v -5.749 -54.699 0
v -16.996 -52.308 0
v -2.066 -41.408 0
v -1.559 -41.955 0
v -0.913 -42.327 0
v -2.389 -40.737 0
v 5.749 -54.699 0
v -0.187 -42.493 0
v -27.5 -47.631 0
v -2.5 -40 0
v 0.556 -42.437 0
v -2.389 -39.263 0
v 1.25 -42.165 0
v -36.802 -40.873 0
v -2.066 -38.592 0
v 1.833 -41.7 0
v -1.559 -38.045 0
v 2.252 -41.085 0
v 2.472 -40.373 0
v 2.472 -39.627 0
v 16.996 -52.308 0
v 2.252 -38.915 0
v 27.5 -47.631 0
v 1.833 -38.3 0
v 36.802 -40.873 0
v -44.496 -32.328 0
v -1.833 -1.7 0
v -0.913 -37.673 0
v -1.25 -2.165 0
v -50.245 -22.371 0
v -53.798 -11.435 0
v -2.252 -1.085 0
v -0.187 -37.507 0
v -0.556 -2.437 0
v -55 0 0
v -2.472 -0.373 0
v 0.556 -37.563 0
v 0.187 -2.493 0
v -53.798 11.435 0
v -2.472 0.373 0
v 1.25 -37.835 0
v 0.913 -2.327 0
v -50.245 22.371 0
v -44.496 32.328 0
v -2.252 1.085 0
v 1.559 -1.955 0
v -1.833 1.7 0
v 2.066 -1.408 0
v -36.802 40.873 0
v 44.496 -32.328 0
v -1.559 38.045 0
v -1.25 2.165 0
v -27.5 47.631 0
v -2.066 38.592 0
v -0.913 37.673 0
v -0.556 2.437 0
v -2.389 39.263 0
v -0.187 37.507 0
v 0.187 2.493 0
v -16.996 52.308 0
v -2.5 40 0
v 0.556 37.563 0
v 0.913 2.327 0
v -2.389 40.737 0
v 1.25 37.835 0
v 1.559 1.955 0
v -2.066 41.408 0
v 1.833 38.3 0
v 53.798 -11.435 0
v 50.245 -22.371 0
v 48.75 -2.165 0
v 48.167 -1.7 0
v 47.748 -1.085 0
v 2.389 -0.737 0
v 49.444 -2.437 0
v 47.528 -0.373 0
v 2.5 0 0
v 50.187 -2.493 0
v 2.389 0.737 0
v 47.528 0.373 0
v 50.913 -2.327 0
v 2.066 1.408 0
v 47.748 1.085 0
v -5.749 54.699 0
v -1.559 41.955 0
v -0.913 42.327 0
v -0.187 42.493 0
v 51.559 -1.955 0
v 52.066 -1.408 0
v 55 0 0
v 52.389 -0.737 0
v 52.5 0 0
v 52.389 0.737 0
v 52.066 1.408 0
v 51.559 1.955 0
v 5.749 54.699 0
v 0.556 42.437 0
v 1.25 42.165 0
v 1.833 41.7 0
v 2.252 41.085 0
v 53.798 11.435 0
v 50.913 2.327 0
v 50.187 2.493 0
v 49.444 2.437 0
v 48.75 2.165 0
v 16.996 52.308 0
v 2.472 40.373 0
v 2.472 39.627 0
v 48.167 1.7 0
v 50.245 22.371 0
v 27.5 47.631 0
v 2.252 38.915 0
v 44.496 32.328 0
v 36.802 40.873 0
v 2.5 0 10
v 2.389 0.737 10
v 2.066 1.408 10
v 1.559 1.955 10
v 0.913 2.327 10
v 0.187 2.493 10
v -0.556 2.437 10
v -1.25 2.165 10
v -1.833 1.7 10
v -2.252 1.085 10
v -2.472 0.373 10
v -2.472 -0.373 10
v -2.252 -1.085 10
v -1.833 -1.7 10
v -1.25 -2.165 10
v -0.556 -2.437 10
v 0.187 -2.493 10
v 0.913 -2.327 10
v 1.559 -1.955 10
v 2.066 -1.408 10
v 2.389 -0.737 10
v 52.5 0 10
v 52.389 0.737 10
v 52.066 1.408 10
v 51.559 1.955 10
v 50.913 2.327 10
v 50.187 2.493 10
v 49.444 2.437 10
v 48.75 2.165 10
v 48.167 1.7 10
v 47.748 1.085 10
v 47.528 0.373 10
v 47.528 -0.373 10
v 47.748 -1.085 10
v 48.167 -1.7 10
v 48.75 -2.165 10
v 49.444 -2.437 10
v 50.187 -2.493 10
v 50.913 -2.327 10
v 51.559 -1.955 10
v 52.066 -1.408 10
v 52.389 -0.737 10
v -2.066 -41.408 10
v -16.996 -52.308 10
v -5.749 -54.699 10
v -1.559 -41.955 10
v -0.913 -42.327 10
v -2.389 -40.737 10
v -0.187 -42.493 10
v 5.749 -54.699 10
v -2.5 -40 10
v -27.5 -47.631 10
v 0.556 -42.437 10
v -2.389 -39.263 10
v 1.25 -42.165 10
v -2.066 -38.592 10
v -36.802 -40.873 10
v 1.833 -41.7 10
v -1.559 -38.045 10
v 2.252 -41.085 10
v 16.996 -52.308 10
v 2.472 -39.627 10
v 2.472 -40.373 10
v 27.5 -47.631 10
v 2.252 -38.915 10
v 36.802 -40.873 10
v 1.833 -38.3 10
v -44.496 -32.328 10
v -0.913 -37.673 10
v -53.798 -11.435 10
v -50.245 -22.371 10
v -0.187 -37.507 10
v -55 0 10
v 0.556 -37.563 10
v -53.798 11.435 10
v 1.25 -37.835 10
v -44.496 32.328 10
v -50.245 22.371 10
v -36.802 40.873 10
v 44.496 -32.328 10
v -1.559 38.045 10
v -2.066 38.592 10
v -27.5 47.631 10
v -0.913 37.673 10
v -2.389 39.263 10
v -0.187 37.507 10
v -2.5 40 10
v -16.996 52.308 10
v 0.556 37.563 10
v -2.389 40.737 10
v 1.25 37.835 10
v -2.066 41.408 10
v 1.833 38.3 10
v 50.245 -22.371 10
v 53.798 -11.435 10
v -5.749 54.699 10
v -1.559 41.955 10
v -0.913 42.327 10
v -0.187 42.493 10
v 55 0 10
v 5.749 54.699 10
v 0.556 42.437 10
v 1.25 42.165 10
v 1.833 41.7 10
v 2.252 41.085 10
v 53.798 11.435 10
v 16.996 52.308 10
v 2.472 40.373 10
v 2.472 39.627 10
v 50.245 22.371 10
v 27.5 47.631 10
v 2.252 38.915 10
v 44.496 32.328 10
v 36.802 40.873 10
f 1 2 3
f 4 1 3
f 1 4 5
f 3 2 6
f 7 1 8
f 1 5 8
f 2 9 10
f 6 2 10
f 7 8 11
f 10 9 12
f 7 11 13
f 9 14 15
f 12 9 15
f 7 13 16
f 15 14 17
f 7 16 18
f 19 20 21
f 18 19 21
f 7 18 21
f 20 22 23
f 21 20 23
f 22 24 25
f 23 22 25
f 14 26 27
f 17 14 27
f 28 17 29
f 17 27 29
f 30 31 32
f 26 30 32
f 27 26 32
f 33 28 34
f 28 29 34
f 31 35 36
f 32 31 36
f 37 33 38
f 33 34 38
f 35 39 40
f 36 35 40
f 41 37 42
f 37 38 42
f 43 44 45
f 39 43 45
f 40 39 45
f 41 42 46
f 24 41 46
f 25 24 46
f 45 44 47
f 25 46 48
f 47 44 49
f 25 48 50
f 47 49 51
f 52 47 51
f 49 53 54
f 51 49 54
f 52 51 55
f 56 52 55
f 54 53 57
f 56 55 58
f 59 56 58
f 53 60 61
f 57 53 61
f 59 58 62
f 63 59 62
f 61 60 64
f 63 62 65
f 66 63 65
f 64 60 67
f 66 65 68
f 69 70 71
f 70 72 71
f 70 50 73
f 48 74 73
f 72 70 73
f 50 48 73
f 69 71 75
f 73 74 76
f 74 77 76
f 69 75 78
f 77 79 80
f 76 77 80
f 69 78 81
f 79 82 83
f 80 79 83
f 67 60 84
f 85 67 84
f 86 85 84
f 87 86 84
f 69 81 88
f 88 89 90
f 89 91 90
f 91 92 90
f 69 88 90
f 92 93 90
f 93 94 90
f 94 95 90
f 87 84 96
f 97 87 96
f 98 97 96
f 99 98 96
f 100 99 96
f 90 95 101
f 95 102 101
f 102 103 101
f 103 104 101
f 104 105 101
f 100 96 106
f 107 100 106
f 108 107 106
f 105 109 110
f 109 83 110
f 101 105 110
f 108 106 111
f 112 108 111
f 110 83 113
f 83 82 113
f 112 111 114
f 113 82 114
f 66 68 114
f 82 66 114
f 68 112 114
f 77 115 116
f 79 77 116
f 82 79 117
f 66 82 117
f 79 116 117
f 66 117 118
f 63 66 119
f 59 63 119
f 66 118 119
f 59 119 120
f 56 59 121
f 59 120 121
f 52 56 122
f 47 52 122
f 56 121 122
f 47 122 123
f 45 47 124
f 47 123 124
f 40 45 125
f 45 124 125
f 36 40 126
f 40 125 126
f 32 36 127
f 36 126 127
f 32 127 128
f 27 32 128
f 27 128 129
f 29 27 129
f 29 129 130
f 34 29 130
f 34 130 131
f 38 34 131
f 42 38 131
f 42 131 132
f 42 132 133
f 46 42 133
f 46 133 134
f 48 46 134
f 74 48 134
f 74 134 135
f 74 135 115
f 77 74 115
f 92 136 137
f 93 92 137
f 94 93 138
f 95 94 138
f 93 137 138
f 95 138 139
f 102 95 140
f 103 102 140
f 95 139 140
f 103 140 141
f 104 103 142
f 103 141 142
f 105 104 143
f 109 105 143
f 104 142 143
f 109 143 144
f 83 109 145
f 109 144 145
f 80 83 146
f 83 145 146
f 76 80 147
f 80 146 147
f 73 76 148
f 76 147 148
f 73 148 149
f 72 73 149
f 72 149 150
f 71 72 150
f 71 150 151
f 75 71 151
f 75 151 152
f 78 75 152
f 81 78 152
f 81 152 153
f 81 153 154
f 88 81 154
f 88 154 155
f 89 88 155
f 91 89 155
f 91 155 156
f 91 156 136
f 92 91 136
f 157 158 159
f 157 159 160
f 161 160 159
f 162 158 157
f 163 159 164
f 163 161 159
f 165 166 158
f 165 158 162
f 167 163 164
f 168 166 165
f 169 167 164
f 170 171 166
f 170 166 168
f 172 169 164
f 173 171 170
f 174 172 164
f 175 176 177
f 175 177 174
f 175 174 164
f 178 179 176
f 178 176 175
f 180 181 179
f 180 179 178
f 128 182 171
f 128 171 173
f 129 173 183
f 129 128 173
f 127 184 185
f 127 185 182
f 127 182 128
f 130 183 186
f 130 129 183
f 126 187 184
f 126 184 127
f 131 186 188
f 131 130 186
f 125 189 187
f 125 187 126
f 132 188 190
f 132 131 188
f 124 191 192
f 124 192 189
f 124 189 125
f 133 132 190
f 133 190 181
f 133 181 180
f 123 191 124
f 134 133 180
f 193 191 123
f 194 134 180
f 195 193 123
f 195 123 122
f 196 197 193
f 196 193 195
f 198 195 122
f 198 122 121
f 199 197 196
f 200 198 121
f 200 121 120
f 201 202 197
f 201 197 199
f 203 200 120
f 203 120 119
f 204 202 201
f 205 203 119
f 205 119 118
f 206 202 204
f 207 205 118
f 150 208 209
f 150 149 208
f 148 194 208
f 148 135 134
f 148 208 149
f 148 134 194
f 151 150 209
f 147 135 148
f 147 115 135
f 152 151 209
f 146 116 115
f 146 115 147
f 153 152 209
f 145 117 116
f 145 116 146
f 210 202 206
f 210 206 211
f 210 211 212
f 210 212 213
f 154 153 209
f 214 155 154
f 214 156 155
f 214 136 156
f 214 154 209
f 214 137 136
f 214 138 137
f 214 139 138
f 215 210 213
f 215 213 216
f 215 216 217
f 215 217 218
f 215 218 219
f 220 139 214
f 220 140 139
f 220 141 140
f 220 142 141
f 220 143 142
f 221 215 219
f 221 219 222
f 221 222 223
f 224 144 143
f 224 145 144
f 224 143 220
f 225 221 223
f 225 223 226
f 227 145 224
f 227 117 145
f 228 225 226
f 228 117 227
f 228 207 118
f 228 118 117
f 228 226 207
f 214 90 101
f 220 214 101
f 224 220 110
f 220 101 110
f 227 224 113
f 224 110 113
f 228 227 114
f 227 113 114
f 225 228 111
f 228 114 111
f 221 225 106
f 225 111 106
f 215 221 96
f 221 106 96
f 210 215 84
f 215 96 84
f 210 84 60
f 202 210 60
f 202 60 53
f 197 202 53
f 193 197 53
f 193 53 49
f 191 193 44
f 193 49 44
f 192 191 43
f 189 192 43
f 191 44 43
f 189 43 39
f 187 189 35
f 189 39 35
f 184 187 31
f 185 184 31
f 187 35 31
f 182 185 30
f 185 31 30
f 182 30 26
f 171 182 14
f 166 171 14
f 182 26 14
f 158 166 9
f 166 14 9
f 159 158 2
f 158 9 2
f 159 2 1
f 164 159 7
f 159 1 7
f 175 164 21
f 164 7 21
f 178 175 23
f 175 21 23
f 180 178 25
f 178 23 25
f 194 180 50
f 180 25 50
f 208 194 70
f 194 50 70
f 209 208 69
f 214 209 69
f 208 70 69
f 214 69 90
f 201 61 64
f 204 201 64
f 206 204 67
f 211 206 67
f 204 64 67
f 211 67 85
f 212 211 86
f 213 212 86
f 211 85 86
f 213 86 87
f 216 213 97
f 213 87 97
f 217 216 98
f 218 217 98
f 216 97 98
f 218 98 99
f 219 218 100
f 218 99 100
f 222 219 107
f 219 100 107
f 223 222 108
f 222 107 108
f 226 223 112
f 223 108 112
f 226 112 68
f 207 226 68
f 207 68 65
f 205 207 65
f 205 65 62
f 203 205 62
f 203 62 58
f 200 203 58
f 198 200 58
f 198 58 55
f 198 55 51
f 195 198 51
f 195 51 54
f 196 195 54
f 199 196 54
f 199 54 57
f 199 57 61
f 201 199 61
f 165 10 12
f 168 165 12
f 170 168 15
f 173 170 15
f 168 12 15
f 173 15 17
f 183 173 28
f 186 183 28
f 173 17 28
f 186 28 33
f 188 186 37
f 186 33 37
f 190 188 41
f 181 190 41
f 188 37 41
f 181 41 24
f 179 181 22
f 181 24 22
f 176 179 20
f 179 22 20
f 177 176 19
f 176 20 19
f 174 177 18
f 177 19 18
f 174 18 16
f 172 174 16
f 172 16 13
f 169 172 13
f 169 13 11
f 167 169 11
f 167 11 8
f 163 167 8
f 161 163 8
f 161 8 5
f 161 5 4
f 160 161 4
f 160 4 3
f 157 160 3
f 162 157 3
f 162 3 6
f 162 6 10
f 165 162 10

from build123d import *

# Parameters (mm, degrees)
SKETCH_1_R          = 55
EXTRUDE_1_DEPTH     = 10
SKETCH_2_R          = 2.5
CUT_EXTRUDE_1_DEPTH = 79.421935707
SKETCH_4_R          = 2.5
CUT_EXTRUDE_2_DEPTH = 79.421935707


with BuildPart() as part:
    # 草图1 → 凸台-拉伸1 (new body)
    with BuildSketch(Plane.XY):
        Circle(SKETCH_1_R)
    extrude(amount=EXTRUDE_1_DEPTH)

    # 草图2 → 切除-拉伸1 (cut, through all)
    with BuildSketch(Plane.XY.offset(10)):
        Circle(SKETCH_2_R)
        with Locations((50, 0)):
            Circle(SKETCH_2_R)
    extrude(amount=-CUT_EXTRUDE_1_DEPTH, mode=Mode.SUBTRACT)

    # 草图4 → 切除-拉伸2 (cut, through all)
    with BuildSketch(Plane(origin=(0, 0, 0), x_dir=(-1, 0, 0), z_dir=(0, 0, -1))):
        with Locations((0, -40)):
            Circle(SKETCH_4_R)
        with Locations((0, 40)):
            Circle(SKETCH_4_R)
    extrude(amount=-CUT_EXTRUDE_2_DEPTH, mode=Mode.SUBTRACT)


solid = part.part
